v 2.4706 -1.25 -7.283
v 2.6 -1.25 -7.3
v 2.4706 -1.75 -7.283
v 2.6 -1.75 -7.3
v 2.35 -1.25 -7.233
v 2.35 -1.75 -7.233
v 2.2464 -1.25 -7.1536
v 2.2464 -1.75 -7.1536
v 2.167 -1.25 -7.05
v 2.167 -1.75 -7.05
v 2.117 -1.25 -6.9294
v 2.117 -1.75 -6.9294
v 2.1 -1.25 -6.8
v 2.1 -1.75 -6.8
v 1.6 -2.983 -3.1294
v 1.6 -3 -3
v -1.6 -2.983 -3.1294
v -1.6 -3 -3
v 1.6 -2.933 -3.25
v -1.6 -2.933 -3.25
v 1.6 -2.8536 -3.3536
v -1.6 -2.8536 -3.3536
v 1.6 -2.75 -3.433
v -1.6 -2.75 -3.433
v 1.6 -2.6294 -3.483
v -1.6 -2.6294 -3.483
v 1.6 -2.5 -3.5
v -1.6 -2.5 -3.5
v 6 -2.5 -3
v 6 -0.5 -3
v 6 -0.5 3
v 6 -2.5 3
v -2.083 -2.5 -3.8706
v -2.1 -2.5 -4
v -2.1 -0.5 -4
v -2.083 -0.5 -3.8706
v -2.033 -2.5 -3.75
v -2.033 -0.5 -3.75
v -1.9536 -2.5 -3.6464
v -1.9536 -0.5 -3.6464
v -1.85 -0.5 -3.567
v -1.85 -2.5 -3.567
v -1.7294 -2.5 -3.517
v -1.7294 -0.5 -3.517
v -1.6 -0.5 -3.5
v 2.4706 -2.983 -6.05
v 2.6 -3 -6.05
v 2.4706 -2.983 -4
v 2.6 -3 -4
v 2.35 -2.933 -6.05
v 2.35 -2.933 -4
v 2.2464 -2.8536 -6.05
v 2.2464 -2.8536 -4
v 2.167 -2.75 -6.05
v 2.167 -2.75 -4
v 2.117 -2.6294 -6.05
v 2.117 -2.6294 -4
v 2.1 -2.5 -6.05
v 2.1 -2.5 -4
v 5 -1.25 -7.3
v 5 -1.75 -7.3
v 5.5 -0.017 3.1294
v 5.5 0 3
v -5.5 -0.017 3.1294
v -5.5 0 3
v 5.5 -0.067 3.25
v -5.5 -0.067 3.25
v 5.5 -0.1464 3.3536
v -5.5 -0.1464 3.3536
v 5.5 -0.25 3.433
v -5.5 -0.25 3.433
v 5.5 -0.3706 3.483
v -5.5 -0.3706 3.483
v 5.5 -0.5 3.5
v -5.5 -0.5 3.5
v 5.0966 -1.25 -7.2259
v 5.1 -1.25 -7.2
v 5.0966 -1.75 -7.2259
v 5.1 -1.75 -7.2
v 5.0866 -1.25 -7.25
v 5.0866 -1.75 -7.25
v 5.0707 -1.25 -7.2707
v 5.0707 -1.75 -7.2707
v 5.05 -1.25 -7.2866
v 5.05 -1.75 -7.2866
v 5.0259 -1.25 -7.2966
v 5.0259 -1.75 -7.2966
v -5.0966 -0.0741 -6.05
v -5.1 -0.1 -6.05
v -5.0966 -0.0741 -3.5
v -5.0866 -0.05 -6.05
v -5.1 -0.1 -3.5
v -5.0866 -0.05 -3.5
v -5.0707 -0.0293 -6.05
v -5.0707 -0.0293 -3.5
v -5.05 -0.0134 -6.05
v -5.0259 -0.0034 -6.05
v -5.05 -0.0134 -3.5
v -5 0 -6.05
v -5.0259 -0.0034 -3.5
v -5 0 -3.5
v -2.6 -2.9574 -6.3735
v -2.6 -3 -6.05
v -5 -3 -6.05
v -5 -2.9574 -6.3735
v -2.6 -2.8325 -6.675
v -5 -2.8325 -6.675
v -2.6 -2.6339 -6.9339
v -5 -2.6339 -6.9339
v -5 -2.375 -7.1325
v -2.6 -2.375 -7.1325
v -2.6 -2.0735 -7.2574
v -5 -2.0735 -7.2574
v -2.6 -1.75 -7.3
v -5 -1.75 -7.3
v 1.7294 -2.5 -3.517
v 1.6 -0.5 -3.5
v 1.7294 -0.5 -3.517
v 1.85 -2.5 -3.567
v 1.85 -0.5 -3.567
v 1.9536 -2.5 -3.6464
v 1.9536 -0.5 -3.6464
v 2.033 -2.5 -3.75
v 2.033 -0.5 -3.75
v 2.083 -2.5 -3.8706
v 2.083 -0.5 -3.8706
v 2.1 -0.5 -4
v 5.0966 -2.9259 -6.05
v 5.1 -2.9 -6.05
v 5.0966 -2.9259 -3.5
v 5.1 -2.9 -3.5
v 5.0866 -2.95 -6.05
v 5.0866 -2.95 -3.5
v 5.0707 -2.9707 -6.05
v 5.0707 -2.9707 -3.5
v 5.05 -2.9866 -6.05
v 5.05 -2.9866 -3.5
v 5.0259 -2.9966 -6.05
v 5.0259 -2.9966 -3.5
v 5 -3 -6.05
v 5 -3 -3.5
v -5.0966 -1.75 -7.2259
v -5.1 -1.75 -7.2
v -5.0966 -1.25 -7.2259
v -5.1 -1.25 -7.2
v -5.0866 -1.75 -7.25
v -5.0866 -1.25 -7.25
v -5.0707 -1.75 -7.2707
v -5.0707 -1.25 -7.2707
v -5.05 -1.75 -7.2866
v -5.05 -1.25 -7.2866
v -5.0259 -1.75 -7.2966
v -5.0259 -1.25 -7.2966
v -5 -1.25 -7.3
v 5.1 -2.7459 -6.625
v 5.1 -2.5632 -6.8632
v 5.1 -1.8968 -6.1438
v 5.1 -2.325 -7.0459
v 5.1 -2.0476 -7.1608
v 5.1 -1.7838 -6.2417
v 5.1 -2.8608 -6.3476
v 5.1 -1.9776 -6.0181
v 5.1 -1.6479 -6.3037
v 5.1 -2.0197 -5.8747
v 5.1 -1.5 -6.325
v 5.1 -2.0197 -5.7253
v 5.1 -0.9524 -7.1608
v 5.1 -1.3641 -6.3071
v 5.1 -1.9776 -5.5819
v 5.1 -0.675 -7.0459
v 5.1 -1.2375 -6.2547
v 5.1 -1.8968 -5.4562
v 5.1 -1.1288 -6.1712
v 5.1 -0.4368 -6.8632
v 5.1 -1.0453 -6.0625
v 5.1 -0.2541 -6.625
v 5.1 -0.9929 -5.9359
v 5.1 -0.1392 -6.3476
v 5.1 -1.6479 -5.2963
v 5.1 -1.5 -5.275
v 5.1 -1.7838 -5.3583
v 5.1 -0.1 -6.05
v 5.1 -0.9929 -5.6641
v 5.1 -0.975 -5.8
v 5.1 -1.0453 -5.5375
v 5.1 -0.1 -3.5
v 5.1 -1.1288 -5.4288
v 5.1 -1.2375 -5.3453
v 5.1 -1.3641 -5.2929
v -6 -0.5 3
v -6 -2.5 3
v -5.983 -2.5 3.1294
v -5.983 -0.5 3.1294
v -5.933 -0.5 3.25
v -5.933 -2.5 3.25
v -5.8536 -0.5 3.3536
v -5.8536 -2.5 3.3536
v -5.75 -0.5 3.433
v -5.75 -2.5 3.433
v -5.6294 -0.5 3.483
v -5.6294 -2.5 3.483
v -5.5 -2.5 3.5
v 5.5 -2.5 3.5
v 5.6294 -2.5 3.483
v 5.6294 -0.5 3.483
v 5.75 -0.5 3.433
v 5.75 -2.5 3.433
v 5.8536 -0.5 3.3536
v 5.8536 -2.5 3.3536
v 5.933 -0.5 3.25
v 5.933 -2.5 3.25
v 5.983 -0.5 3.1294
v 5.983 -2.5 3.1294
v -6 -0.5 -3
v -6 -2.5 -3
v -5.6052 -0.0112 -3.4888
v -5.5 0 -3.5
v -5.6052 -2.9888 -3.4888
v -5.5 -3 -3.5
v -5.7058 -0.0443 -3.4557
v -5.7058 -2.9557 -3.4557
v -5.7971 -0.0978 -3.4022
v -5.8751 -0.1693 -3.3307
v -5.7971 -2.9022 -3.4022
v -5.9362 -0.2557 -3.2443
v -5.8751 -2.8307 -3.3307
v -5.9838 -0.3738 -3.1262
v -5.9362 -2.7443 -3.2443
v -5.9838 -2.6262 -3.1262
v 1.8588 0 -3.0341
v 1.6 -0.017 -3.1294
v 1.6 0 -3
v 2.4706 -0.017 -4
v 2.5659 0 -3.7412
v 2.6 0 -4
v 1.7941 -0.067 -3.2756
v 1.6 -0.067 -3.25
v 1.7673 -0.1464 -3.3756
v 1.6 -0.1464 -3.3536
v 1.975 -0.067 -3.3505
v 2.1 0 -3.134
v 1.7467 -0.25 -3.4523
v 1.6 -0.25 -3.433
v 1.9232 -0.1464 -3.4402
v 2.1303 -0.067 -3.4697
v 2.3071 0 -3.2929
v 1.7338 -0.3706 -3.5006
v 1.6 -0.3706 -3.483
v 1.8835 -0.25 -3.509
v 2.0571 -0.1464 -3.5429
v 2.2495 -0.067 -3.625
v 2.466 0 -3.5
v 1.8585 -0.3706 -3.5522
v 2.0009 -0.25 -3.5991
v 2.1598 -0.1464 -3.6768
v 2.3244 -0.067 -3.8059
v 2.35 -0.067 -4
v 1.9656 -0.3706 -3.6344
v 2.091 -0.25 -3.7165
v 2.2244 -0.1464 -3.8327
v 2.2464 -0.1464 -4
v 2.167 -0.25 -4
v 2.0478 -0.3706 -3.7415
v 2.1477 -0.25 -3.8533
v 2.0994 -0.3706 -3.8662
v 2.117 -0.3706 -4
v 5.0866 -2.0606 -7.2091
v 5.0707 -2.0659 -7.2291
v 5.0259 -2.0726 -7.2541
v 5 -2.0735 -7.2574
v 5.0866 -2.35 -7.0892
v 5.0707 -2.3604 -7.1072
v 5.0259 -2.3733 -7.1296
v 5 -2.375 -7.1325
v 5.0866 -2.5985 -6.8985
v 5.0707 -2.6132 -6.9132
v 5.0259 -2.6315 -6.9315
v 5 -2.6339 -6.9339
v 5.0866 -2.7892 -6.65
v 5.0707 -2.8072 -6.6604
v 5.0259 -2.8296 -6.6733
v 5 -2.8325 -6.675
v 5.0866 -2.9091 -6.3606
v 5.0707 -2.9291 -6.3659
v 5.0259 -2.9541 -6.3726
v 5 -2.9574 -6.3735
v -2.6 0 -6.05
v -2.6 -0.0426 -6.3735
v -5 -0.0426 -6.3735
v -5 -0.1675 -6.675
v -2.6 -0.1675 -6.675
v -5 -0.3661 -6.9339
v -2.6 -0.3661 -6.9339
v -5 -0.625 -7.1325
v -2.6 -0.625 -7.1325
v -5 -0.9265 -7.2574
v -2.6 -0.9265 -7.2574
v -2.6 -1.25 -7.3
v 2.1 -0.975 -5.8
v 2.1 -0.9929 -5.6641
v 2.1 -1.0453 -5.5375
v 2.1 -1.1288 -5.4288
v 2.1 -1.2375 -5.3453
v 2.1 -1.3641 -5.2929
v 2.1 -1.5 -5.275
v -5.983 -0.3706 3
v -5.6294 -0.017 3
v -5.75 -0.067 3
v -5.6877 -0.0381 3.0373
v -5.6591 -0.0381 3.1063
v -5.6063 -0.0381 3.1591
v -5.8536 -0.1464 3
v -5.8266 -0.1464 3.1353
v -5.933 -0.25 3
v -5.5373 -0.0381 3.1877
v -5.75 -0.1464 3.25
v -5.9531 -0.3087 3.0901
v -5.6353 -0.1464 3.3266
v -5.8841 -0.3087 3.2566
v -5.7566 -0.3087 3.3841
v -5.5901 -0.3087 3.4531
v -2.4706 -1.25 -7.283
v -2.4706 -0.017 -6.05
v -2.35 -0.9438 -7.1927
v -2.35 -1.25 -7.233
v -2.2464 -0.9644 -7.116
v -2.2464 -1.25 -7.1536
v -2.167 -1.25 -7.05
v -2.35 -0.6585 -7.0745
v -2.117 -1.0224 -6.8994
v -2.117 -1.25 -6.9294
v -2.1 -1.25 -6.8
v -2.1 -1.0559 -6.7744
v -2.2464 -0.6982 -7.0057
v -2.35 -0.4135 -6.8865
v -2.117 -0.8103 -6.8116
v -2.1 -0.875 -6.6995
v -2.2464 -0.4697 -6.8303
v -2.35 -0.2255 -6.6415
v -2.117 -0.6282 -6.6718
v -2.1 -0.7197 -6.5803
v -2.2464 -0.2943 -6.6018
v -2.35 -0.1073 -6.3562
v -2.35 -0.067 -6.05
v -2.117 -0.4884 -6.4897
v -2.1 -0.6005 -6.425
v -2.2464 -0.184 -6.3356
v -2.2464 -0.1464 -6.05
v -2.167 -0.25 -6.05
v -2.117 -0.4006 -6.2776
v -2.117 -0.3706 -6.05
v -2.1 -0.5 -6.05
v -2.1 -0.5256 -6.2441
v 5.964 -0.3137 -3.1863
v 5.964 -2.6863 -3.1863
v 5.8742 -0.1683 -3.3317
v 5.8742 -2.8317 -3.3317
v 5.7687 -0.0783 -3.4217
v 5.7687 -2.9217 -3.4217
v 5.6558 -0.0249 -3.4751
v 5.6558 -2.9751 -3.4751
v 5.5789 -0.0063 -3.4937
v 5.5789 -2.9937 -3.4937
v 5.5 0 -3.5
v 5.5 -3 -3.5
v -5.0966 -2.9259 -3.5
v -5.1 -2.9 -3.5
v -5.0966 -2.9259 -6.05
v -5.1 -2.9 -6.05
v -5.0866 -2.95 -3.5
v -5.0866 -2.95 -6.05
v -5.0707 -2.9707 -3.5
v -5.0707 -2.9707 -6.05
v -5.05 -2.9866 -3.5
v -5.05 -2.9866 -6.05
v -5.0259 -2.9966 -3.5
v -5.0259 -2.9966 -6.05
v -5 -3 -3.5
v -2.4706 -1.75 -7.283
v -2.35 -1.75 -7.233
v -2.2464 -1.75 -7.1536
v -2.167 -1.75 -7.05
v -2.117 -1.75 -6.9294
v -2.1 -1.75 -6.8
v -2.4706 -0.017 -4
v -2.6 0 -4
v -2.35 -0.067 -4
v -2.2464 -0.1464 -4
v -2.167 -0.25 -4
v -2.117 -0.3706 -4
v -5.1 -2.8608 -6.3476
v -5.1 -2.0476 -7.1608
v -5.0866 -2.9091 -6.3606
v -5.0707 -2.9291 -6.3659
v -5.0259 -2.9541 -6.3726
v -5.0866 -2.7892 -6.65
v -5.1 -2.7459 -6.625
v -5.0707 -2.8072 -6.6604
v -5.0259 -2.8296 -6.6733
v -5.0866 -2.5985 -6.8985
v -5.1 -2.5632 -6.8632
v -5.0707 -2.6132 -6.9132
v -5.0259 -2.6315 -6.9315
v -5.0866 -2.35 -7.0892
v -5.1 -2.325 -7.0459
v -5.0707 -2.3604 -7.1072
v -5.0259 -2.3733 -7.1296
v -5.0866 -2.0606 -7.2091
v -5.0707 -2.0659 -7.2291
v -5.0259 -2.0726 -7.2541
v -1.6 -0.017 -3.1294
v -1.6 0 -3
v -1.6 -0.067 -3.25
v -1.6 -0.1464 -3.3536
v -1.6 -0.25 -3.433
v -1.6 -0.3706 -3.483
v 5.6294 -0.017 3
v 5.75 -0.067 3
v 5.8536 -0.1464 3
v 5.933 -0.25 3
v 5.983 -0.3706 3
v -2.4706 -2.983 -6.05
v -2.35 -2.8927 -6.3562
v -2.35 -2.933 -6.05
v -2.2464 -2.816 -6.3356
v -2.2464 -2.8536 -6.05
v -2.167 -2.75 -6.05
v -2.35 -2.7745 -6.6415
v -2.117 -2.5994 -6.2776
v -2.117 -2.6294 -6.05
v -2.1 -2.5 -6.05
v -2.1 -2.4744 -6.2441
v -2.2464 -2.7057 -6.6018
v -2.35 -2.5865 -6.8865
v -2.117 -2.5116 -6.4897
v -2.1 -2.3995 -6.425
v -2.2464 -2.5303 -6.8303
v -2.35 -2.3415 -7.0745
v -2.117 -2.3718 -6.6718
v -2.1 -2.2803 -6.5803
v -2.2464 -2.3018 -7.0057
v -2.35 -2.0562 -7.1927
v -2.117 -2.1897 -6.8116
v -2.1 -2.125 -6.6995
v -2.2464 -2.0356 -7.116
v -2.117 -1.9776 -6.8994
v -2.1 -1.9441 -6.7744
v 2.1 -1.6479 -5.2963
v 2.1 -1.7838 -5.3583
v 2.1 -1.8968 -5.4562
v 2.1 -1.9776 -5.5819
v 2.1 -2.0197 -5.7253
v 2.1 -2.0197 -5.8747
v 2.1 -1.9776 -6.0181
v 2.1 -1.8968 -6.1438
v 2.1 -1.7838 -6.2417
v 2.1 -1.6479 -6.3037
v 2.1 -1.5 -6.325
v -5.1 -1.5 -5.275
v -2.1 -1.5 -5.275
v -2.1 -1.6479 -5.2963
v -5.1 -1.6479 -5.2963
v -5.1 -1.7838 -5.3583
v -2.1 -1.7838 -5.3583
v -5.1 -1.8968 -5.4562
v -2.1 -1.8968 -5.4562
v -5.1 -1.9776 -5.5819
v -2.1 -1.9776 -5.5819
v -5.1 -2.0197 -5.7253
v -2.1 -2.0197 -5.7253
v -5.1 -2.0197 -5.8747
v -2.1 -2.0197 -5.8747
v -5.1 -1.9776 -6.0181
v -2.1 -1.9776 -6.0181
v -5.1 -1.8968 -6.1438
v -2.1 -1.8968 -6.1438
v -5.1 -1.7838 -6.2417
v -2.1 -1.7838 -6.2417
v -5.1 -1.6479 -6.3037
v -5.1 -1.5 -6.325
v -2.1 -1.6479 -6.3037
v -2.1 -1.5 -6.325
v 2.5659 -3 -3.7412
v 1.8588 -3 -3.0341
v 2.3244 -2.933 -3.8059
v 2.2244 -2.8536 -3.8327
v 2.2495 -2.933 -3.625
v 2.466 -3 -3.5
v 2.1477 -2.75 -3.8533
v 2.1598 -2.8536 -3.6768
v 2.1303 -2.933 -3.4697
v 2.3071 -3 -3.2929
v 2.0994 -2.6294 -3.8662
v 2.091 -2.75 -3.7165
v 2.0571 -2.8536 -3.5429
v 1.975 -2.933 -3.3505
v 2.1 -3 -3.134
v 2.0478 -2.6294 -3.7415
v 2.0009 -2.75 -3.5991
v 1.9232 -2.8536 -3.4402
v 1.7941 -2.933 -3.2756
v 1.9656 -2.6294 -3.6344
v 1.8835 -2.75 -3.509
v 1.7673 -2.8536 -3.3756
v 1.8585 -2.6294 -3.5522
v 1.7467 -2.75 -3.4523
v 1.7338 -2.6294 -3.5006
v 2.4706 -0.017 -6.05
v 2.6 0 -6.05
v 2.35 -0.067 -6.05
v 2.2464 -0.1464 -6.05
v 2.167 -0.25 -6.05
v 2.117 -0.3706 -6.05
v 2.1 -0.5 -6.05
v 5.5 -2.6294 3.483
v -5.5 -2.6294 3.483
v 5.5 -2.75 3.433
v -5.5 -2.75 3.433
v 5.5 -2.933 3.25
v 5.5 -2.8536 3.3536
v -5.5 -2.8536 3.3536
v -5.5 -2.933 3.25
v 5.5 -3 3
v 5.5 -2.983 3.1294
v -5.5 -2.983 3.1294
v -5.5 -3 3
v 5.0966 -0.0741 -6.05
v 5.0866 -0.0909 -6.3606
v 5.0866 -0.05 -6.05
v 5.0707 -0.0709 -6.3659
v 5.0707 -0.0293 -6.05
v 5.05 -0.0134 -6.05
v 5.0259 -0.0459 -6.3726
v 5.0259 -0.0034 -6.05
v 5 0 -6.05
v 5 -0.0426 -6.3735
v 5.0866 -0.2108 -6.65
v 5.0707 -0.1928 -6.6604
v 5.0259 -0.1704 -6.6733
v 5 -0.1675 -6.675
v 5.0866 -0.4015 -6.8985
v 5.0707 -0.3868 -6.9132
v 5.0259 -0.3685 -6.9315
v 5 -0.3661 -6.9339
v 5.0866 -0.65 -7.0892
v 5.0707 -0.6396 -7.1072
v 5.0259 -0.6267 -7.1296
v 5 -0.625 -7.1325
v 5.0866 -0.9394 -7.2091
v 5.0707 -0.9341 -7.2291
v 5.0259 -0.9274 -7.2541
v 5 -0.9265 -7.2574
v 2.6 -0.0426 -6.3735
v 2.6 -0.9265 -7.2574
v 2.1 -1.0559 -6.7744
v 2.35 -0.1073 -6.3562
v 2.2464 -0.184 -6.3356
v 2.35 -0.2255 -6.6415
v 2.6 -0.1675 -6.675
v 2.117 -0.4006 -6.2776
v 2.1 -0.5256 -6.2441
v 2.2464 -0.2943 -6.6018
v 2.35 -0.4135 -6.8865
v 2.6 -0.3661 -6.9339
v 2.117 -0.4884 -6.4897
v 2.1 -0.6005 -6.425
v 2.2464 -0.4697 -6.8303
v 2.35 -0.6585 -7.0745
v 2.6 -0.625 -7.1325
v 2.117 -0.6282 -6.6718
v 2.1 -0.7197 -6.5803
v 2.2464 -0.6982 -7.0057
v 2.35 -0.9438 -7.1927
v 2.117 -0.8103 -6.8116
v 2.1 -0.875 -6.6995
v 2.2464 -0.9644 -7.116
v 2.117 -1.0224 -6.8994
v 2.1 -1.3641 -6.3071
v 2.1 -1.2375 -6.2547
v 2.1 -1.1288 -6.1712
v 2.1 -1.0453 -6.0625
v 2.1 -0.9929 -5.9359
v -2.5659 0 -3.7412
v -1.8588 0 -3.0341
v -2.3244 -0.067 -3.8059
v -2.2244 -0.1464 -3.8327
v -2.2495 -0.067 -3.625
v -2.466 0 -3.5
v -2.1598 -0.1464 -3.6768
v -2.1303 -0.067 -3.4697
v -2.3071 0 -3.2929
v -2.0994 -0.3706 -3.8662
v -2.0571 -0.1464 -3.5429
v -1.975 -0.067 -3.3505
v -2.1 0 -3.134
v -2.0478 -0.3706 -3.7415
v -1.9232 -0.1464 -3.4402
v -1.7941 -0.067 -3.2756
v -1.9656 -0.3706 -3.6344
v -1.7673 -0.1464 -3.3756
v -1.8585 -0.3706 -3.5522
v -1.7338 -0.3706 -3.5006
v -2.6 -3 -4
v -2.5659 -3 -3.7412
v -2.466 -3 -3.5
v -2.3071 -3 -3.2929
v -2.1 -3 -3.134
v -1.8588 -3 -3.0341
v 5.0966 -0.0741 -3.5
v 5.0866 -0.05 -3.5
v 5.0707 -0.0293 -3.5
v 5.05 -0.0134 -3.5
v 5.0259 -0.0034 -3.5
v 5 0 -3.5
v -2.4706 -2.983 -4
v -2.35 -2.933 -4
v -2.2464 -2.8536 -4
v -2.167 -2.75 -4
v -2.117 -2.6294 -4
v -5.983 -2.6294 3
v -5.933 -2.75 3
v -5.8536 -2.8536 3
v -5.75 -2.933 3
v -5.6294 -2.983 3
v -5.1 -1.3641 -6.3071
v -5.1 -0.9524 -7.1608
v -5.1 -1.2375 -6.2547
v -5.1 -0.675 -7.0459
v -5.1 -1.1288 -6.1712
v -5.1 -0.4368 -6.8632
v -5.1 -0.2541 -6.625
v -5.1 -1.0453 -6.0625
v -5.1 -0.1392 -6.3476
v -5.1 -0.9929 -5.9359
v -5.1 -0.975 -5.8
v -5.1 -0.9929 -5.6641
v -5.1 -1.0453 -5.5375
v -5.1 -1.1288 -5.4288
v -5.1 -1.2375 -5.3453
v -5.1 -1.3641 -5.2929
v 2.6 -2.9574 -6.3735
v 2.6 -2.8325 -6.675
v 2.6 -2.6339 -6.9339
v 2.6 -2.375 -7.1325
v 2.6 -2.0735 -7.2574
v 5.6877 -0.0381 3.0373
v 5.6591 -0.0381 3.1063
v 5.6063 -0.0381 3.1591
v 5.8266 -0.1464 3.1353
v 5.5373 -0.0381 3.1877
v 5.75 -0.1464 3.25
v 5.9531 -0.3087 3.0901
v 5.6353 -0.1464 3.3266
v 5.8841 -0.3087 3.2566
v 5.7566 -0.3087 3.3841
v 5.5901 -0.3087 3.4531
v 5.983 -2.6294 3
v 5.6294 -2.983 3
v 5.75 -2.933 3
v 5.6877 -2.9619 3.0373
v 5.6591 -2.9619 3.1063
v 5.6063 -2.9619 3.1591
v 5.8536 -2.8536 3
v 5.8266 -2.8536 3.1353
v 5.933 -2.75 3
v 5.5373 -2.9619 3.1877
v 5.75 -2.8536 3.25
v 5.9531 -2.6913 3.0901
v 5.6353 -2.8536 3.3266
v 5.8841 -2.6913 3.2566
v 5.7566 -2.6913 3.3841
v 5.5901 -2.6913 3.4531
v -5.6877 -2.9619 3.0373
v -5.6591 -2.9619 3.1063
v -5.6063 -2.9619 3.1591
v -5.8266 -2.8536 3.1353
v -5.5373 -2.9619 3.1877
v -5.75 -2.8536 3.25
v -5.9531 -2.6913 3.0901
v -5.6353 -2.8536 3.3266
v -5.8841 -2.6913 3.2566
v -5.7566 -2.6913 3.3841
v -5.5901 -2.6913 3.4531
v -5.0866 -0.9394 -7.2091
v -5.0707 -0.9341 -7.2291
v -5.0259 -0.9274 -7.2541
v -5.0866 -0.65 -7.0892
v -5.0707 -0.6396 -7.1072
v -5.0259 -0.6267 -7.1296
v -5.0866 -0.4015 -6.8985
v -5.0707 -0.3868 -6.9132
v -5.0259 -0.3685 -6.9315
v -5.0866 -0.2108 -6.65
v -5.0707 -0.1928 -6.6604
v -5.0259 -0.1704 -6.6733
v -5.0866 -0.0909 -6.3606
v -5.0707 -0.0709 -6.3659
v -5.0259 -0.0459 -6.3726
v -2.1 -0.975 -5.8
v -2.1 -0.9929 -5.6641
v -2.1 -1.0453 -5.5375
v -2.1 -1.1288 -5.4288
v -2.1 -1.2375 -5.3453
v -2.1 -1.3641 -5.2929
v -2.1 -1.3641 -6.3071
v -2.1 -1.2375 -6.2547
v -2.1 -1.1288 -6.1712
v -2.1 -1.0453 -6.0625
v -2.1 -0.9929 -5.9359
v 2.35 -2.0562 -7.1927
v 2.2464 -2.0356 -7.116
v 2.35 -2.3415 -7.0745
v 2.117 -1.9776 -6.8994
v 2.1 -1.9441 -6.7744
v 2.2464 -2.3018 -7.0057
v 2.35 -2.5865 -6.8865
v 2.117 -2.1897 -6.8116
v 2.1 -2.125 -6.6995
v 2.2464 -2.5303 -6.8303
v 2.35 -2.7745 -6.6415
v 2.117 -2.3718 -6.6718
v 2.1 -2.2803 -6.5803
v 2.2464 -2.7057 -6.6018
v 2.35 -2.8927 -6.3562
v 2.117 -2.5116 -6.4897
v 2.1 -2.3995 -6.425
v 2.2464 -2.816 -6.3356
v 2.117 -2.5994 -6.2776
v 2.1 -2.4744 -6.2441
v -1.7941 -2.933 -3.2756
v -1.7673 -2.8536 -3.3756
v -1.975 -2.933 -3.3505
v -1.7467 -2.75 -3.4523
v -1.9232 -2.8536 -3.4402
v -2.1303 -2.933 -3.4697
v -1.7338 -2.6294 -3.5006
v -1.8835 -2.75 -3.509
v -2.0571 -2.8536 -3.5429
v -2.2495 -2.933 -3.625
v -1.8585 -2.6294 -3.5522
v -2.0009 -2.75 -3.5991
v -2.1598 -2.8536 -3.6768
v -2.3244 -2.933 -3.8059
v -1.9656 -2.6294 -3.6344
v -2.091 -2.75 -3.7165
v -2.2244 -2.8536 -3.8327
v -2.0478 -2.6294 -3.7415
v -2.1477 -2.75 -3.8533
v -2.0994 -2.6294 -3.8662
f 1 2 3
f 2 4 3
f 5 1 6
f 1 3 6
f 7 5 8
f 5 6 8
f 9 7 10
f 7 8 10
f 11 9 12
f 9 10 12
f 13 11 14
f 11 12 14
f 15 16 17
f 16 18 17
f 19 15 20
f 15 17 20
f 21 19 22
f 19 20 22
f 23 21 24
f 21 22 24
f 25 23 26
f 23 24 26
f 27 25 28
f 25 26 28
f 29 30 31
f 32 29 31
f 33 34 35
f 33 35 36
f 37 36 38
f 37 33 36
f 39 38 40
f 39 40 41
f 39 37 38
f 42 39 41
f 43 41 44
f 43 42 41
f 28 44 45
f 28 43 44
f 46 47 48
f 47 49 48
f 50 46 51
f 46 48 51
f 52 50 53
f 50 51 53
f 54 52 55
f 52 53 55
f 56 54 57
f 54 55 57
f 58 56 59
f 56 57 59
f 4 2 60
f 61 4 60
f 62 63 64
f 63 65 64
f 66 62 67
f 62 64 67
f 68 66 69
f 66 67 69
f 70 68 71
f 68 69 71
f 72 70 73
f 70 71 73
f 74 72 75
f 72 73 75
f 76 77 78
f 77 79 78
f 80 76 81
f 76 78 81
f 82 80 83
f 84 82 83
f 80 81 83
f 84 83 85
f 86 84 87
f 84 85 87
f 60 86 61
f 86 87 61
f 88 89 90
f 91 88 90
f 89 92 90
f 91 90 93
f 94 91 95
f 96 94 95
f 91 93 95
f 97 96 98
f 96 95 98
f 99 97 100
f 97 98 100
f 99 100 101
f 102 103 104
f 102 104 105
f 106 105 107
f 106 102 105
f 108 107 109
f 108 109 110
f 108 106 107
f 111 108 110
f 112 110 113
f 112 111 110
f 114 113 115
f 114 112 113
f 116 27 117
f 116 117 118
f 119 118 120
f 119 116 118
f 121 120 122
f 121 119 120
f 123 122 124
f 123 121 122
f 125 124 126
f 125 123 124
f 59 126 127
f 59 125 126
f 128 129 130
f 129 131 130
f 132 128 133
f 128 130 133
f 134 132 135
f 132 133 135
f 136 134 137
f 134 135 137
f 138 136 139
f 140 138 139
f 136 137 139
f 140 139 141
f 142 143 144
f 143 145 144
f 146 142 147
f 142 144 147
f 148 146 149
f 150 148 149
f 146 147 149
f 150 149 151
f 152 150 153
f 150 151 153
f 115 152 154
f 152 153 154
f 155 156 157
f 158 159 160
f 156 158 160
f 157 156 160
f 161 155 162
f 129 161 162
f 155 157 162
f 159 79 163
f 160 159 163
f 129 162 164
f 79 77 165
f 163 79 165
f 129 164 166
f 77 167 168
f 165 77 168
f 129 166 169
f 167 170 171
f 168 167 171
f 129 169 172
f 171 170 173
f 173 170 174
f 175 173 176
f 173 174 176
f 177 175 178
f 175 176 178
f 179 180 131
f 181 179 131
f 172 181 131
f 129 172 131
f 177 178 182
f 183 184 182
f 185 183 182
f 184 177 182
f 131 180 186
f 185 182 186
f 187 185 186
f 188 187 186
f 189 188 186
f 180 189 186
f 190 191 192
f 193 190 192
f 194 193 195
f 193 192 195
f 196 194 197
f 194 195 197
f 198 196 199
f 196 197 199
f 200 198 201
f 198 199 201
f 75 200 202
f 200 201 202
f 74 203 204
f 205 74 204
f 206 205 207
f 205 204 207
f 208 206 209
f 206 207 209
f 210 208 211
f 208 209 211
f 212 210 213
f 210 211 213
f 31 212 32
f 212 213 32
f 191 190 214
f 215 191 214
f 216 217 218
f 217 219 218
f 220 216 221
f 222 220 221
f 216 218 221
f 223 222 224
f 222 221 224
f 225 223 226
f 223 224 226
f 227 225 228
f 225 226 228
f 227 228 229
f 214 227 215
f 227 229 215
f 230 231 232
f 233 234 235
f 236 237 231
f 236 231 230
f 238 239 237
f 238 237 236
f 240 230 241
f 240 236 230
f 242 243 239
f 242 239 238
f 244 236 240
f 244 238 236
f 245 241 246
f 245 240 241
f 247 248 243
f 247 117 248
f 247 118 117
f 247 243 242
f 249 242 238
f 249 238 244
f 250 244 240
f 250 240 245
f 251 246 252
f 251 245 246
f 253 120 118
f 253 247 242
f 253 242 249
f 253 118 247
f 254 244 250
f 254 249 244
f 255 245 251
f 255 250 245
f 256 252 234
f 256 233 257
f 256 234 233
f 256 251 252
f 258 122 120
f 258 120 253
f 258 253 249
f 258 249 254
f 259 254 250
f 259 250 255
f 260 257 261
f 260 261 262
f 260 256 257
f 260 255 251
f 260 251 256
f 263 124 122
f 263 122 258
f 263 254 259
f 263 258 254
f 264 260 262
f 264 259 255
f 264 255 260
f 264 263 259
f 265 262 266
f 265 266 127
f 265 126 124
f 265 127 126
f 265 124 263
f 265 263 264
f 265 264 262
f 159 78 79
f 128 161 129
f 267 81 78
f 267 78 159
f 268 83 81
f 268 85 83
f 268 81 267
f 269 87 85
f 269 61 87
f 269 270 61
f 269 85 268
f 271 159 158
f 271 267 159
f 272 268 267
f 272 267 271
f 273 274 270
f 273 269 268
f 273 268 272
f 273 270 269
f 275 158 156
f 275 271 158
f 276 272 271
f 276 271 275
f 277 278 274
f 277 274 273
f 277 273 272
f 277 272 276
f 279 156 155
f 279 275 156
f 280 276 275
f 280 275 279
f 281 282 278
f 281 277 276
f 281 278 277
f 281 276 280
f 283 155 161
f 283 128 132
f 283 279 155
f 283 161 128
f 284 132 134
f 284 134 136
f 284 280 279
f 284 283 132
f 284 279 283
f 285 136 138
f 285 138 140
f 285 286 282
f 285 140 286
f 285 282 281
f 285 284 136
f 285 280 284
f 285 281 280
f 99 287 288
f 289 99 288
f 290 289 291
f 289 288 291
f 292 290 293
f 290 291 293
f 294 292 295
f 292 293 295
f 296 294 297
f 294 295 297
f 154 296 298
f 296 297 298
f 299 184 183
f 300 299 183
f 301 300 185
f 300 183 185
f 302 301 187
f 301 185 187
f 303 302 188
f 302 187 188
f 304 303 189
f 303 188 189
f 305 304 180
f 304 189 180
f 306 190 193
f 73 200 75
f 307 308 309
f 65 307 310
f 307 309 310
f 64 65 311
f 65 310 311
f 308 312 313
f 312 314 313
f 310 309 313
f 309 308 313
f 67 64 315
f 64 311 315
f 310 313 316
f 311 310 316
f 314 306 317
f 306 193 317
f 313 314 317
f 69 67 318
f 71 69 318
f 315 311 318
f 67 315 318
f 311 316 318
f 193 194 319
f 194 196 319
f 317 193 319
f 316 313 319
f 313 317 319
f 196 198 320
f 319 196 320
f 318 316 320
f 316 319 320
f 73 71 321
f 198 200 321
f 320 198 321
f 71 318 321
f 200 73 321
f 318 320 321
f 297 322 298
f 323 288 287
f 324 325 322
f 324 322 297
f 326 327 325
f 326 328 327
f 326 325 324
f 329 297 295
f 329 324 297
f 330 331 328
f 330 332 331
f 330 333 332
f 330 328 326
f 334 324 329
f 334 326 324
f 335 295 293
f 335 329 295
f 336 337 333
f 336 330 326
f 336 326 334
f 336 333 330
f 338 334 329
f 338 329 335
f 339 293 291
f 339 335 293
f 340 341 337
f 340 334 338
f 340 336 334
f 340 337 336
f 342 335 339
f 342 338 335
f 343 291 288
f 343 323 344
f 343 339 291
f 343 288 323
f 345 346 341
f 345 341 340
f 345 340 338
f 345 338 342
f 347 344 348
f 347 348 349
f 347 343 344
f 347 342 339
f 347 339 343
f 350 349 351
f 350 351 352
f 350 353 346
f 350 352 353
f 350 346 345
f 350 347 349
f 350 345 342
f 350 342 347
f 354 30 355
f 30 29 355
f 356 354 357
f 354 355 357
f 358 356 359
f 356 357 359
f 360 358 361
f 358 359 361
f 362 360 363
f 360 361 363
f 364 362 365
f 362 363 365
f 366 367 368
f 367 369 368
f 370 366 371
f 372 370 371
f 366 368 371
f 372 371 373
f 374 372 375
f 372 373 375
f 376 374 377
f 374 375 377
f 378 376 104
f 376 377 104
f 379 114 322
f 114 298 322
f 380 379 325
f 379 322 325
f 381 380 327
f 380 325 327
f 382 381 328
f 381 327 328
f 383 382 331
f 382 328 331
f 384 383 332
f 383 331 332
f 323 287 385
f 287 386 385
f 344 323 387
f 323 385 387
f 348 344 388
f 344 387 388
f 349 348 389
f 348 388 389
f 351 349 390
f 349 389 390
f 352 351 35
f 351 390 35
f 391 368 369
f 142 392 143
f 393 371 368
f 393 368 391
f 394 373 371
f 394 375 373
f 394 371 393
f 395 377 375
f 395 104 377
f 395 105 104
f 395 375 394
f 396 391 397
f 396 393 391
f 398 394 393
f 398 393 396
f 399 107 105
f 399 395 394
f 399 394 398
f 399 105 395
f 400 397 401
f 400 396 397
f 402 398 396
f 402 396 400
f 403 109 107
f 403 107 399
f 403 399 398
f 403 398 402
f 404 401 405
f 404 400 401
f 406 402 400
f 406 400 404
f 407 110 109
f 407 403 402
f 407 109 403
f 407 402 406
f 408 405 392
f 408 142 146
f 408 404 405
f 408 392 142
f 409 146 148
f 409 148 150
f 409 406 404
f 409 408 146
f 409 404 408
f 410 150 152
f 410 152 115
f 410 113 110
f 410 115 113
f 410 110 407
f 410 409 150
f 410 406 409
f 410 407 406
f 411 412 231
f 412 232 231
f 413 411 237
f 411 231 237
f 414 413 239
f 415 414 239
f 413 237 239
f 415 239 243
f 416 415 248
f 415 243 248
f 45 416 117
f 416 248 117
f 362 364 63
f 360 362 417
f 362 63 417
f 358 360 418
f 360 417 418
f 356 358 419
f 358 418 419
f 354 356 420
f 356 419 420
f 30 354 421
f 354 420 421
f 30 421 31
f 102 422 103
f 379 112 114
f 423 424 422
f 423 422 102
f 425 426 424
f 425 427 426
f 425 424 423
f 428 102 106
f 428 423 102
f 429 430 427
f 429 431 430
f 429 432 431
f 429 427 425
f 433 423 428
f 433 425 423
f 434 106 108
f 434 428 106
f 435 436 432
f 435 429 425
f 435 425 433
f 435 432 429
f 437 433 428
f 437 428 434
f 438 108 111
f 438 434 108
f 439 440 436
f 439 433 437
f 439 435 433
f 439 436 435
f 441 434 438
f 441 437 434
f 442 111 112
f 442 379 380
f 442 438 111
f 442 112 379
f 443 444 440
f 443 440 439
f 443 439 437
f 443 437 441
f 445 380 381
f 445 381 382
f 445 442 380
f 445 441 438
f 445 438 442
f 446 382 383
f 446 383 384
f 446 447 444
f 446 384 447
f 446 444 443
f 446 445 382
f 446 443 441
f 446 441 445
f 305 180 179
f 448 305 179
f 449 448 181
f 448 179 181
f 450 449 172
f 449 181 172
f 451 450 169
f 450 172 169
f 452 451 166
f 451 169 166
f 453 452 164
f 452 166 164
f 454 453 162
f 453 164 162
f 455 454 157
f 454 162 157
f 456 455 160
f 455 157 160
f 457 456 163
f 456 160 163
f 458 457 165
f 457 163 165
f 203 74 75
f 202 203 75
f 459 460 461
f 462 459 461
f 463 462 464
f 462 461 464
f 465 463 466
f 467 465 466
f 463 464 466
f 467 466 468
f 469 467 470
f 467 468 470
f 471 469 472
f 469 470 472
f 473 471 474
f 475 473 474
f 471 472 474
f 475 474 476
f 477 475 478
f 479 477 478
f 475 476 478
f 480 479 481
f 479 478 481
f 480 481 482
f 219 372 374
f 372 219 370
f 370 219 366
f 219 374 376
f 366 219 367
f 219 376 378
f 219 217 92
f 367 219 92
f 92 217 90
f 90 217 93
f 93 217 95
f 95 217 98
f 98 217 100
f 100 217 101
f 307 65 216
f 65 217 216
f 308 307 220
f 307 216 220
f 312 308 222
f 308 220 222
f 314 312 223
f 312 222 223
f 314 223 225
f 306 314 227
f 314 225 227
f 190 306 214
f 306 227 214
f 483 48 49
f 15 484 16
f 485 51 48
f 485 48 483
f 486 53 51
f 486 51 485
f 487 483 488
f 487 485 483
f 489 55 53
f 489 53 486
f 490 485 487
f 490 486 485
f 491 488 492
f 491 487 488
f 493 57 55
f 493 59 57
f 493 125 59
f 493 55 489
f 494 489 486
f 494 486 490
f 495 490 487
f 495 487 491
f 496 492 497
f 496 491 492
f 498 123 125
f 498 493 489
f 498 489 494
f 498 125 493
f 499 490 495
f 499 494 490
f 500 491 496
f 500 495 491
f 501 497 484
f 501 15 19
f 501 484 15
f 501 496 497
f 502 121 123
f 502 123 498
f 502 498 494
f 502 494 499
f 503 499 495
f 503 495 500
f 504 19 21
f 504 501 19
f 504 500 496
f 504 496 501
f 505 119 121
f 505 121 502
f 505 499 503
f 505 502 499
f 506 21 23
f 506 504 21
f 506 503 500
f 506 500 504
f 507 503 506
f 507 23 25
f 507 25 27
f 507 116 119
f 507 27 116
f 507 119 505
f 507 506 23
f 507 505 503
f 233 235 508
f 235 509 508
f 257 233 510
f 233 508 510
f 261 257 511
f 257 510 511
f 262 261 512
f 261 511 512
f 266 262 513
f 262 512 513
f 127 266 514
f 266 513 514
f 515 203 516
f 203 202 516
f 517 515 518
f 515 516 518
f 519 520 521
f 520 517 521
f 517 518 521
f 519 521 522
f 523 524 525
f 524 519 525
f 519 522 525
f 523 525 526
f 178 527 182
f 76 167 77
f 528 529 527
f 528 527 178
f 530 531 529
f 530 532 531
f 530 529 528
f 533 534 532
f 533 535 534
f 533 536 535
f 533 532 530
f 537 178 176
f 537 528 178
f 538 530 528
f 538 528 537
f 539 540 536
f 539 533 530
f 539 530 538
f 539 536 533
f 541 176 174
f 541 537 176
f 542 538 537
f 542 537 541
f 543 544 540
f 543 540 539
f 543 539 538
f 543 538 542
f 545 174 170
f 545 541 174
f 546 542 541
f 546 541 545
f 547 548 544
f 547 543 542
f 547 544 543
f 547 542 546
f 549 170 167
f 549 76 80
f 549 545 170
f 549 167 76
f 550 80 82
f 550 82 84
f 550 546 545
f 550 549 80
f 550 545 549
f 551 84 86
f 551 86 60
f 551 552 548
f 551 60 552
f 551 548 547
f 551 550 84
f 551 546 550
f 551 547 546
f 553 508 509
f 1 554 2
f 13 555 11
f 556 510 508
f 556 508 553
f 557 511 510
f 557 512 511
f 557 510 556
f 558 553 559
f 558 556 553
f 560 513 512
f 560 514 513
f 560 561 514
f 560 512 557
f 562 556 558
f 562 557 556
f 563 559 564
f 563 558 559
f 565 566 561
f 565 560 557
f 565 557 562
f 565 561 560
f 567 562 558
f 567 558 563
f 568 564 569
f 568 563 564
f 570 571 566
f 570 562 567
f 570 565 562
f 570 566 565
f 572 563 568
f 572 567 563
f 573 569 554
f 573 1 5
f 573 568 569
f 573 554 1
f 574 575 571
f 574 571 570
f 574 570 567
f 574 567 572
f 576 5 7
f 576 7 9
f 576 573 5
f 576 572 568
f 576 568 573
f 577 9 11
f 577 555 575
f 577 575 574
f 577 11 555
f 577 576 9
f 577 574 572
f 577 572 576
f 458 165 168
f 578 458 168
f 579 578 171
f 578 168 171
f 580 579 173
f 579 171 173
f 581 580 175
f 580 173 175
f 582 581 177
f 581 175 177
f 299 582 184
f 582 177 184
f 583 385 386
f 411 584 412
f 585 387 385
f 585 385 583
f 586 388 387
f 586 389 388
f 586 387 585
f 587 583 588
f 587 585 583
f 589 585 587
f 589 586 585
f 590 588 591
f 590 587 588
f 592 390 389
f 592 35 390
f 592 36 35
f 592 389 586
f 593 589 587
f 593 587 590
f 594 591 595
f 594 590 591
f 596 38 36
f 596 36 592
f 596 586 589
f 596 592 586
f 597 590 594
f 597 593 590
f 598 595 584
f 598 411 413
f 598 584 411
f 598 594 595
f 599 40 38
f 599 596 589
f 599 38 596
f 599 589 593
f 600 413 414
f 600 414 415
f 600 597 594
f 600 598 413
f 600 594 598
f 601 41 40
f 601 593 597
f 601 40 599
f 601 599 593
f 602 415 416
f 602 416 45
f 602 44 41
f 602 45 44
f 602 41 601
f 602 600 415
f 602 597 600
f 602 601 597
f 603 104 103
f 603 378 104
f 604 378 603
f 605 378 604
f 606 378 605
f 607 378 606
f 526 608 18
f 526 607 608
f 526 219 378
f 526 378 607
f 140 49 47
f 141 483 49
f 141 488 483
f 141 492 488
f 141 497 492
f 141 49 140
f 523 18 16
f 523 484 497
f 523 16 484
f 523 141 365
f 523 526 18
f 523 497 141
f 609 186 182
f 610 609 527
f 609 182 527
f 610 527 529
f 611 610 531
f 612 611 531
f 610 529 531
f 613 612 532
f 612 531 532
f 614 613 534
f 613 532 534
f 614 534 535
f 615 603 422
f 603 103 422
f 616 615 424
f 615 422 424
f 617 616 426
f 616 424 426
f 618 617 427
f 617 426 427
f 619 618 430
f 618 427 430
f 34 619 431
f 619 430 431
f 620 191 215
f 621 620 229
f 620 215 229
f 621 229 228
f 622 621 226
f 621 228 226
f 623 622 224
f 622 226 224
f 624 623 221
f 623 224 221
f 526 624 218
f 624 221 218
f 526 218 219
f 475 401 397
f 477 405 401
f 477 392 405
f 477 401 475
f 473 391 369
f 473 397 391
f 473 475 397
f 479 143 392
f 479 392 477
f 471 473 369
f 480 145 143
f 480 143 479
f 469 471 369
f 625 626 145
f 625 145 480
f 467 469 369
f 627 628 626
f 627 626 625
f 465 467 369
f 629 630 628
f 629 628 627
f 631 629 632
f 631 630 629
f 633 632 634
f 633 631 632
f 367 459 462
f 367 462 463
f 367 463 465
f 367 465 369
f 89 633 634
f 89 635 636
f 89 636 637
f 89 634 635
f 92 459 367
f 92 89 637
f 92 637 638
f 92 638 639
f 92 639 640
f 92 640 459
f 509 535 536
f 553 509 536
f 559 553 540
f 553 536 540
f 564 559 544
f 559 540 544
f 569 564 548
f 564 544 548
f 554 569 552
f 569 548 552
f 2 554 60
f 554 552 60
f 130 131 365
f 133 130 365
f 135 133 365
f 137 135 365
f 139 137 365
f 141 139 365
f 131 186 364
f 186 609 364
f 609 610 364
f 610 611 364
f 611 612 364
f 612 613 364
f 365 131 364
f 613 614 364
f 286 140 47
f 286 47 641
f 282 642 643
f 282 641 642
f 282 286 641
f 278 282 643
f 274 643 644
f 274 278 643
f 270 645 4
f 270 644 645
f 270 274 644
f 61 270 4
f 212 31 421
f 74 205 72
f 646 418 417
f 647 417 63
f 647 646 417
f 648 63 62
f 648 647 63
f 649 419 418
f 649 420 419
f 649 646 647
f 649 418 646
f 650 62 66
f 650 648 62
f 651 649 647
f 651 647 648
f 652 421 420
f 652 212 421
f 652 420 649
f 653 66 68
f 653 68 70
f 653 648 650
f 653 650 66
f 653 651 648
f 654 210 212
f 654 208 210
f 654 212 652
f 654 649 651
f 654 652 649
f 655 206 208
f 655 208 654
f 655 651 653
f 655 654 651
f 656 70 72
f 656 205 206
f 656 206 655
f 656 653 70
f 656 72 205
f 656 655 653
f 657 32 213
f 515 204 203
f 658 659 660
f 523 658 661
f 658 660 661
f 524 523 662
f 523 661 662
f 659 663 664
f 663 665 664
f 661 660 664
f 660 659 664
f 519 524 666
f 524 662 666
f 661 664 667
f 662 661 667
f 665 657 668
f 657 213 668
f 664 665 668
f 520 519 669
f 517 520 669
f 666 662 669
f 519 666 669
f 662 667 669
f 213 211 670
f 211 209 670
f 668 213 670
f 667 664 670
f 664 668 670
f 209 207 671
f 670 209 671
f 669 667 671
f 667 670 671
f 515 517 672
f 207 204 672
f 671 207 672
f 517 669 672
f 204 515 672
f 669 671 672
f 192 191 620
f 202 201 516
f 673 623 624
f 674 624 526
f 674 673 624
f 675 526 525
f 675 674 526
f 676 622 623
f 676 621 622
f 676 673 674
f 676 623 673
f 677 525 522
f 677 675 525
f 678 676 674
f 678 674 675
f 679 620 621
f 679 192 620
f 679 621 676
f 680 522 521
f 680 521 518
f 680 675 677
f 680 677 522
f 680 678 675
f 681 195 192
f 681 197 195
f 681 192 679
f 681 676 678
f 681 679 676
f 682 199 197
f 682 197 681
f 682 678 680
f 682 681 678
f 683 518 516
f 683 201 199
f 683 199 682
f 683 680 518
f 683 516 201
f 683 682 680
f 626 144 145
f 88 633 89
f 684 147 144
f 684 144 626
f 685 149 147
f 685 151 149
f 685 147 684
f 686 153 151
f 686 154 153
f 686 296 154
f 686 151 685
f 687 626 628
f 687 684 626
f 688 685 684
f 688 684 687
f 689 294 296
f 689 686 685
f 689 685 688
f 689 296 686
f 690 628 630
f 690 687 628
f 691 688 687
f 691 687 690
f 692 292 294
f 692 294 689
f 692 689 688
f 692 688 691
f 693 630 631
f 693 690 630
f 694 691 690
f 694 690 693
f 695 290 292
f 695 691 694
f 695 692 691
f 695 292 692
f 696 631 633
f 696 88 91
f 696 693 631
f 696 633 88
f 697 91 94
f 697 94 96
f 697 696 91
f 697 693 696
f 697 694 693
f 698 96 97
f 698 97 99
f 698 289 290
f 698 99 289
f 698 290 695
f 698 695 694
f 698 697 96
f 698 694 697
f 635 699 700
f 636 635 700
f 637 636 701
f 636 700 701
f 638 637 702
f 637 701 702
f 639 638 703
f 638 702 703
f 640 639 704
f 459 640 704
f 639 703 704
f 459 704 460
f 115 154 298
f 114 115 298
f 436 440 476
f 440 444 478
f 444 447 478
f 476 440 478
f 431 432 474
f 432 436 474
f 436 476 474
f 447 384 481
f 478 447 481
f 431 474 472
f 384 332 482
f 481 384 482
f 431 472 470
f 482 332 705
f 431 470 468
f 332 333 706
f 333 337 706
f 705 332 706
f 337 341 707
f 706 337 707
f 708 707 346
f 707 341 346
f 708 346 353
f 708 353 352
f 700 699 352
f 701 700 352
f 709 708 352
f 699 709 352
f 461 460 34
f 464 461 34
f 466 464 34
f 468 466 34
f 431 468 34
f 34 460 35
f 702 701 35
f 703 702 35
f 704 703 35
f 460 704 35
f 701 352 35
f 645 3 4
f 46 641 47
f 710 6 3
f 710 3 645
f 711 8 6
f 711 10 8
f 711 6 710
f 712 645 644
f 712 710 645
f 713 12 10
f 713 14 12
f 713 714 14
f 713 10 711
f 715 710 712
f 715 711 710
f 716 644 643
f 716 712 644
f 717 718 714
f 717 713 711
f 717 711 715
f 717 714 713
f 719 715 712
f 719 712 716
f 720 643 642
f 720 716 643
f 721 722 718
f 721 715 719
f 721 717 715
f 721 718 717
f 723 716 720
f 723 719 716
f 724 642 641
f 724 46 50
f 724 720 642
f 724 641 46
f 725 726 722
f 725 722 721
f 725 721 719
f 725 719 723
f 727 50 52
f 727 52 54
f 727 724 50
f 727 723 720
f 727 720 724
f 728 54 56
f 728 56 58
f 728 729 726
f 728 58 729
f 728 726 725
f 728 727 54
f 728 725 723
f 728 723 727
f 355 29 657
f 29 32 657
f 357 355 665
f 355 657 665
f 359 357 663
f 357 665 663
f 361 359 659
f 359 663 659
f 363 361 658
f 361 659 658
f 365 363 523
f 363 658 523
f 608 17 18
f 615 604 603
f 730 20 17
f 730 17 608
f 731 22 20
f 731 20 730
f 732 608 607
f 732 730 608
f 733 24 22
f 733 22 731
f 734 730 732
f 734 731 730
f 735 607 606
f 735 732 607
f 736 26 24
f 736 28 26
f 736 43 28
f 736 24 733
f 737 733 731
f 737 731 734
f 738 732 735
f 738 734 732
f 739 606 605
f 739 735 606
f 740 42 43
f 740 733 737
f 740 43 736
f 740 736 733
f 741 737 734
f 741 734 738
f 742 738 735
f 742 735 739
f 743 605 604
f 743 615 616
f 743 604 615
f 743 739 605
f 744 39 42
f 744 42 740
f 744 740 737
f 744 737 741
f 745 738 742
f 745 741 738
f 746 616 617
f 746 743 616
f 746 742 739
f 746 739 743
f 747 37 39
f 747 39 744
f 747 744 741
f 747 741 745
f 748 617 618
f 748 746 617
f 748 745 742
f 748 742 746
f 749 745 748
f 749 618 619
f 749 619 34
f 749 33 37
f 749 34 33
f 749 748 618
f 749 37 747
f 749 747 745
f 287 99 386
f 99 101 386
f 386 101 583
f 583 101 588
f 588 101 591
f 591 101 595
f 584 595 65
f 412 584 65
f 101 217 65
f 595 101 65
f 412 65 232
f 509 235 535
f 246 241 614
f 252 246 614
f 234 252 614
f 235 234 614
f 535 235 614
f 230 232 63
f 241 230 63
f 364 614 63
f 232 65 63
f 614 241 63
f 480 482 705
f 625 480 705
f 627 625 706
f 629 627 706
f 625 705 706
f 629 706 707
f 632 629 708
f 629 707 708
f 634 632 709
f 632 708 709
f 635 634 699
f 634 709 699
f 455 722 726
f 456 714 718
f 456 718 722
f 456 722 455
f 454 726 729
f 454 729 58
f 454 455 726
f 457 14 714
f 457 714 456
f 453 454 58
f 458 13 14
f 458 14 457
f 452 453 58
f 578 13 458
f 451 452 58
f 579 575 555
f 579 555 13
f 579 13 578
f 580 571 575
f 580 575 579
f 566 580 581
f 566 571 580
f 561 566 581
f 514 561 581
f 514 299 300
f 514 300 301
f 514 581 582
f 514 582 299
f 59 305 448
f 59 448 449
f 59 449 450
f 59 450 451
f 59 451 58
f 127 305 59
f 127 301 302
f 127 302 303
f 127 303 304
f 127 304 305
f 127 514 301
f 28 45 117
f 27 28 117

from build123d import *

# Parameters (mm, degrees)
F0_W     = 3
F0_H     = 3.8
F1_DEPTH = 3
F3_DEPTH = 11.101
F4_R     = 1.25
F5_F1_R  = 0.5
F5_F2_R  = 0.5
F6_R     = 0.1


with BuildPart() as f1:
    # F0 (on Front) → F1 (new body)
    with BuildSketch(Plane.XZ):
        Polygon((6, -3.5), (6, 3.5), (0, 3.5), (0, -3.5), (2.1, -3.5), (5.1, -3.5), align=None)
        with Locations((3.6, -5.4)):
            Rectangle(F0_W, F0_H)
        with Locations((-3.6, -5.4)):
            Rectangle(F0_W, F0_H)
        Polygon((0, -3.5), (0, 3.5), (-6, 3.5), (-6, -3.5), (-5.1, -3.5), (-2.1, -3.5), align=None)
    extrude(amount=F1_DEPTH)

    # F2 (on face) → F3 (cut, through all)
    with BuildSketch(Plane.YZ.offset(5.1)):
        with BuildLine():
            ThreePointArc((-1.5, -5.275), (-2.025, -5.8), (-1.5, -6.325))
            Line((-1.5, -6.325), (-1.5, -5.275))
        make_face()
        with BuildLine():
            Line((-1.5, -5.275), (-1.5, -6.325))
            ThreePointArc((-1.5, -6.325), (-1.1287689399, -6.1712310601), (-0.975, -5.8))
            ThreePointArc((-0.975, -5.8), (-1.1287689399, -5.4287689399), (-1.5, -5.275))
        make_face()
    extrude(amount=-F3_DEPTH, mode=Mode.SUBTRACT)

    # F4
    f4_edges = [f1.edges().sort_by_distance(p)[0] for p in [
        (-3.6, -3, -7.3),
        (-3.6, 0, -7.3),
        (3.6, -3, -7.3),
        (3.6, 0, -7.3),
    ]]
    fillet(f4_edges, radius=F4_R)

    # F5: fillet of radius 0.5 on 14 edges, made by hand

    # F5_f1
    f5_f1_edges = [f1.edges().sort_by_distance(p)[0] for p in [
        (-2.1, -1.5, -3.5),
        (2.1, -1.5, -3.5),
    ]]
    fillet(f5_f1_edges, radius=F5_F1_R)

    # F5_f2
    f5_f2_edges = [f1.edges().sort_by_distance(p)[0] for p in [
        (0, 0, -3.5),
        (0, -3, -3.5),
        (-6, -1.5, 3.5),
        (-6, -1.5, -3.5),
        (-6, 0, 0),
        (-6, -3, 0),
        (6, -1.5, -3.5),
        (6, -1.5, 3.5),
        (6, 0, 0),
        (6, -3, 0),
        (0, 0, 3.5),
        (0, -3, 3.5),
        (-1.9535533906, -3, -3.6464466094),
        (1.9535533906, -3, -3.6464466094),
        (-1.9535533906, 0, -3.6464466094),
        (1.9535533906, 0, -3.6464466094),
    ]]
    fillet(f5_f2_edges, radius=F5_F2_R)

    # F6
    f6_edges = [f1.edges().sort_by_distance(p)[0] for p in [
        (-5.1, -2.633883, -6.933883),
        (5.1, -3, -4.775),
    ]]
    fillet(f6_edges, radius=F6_R)


solid = f1.part
